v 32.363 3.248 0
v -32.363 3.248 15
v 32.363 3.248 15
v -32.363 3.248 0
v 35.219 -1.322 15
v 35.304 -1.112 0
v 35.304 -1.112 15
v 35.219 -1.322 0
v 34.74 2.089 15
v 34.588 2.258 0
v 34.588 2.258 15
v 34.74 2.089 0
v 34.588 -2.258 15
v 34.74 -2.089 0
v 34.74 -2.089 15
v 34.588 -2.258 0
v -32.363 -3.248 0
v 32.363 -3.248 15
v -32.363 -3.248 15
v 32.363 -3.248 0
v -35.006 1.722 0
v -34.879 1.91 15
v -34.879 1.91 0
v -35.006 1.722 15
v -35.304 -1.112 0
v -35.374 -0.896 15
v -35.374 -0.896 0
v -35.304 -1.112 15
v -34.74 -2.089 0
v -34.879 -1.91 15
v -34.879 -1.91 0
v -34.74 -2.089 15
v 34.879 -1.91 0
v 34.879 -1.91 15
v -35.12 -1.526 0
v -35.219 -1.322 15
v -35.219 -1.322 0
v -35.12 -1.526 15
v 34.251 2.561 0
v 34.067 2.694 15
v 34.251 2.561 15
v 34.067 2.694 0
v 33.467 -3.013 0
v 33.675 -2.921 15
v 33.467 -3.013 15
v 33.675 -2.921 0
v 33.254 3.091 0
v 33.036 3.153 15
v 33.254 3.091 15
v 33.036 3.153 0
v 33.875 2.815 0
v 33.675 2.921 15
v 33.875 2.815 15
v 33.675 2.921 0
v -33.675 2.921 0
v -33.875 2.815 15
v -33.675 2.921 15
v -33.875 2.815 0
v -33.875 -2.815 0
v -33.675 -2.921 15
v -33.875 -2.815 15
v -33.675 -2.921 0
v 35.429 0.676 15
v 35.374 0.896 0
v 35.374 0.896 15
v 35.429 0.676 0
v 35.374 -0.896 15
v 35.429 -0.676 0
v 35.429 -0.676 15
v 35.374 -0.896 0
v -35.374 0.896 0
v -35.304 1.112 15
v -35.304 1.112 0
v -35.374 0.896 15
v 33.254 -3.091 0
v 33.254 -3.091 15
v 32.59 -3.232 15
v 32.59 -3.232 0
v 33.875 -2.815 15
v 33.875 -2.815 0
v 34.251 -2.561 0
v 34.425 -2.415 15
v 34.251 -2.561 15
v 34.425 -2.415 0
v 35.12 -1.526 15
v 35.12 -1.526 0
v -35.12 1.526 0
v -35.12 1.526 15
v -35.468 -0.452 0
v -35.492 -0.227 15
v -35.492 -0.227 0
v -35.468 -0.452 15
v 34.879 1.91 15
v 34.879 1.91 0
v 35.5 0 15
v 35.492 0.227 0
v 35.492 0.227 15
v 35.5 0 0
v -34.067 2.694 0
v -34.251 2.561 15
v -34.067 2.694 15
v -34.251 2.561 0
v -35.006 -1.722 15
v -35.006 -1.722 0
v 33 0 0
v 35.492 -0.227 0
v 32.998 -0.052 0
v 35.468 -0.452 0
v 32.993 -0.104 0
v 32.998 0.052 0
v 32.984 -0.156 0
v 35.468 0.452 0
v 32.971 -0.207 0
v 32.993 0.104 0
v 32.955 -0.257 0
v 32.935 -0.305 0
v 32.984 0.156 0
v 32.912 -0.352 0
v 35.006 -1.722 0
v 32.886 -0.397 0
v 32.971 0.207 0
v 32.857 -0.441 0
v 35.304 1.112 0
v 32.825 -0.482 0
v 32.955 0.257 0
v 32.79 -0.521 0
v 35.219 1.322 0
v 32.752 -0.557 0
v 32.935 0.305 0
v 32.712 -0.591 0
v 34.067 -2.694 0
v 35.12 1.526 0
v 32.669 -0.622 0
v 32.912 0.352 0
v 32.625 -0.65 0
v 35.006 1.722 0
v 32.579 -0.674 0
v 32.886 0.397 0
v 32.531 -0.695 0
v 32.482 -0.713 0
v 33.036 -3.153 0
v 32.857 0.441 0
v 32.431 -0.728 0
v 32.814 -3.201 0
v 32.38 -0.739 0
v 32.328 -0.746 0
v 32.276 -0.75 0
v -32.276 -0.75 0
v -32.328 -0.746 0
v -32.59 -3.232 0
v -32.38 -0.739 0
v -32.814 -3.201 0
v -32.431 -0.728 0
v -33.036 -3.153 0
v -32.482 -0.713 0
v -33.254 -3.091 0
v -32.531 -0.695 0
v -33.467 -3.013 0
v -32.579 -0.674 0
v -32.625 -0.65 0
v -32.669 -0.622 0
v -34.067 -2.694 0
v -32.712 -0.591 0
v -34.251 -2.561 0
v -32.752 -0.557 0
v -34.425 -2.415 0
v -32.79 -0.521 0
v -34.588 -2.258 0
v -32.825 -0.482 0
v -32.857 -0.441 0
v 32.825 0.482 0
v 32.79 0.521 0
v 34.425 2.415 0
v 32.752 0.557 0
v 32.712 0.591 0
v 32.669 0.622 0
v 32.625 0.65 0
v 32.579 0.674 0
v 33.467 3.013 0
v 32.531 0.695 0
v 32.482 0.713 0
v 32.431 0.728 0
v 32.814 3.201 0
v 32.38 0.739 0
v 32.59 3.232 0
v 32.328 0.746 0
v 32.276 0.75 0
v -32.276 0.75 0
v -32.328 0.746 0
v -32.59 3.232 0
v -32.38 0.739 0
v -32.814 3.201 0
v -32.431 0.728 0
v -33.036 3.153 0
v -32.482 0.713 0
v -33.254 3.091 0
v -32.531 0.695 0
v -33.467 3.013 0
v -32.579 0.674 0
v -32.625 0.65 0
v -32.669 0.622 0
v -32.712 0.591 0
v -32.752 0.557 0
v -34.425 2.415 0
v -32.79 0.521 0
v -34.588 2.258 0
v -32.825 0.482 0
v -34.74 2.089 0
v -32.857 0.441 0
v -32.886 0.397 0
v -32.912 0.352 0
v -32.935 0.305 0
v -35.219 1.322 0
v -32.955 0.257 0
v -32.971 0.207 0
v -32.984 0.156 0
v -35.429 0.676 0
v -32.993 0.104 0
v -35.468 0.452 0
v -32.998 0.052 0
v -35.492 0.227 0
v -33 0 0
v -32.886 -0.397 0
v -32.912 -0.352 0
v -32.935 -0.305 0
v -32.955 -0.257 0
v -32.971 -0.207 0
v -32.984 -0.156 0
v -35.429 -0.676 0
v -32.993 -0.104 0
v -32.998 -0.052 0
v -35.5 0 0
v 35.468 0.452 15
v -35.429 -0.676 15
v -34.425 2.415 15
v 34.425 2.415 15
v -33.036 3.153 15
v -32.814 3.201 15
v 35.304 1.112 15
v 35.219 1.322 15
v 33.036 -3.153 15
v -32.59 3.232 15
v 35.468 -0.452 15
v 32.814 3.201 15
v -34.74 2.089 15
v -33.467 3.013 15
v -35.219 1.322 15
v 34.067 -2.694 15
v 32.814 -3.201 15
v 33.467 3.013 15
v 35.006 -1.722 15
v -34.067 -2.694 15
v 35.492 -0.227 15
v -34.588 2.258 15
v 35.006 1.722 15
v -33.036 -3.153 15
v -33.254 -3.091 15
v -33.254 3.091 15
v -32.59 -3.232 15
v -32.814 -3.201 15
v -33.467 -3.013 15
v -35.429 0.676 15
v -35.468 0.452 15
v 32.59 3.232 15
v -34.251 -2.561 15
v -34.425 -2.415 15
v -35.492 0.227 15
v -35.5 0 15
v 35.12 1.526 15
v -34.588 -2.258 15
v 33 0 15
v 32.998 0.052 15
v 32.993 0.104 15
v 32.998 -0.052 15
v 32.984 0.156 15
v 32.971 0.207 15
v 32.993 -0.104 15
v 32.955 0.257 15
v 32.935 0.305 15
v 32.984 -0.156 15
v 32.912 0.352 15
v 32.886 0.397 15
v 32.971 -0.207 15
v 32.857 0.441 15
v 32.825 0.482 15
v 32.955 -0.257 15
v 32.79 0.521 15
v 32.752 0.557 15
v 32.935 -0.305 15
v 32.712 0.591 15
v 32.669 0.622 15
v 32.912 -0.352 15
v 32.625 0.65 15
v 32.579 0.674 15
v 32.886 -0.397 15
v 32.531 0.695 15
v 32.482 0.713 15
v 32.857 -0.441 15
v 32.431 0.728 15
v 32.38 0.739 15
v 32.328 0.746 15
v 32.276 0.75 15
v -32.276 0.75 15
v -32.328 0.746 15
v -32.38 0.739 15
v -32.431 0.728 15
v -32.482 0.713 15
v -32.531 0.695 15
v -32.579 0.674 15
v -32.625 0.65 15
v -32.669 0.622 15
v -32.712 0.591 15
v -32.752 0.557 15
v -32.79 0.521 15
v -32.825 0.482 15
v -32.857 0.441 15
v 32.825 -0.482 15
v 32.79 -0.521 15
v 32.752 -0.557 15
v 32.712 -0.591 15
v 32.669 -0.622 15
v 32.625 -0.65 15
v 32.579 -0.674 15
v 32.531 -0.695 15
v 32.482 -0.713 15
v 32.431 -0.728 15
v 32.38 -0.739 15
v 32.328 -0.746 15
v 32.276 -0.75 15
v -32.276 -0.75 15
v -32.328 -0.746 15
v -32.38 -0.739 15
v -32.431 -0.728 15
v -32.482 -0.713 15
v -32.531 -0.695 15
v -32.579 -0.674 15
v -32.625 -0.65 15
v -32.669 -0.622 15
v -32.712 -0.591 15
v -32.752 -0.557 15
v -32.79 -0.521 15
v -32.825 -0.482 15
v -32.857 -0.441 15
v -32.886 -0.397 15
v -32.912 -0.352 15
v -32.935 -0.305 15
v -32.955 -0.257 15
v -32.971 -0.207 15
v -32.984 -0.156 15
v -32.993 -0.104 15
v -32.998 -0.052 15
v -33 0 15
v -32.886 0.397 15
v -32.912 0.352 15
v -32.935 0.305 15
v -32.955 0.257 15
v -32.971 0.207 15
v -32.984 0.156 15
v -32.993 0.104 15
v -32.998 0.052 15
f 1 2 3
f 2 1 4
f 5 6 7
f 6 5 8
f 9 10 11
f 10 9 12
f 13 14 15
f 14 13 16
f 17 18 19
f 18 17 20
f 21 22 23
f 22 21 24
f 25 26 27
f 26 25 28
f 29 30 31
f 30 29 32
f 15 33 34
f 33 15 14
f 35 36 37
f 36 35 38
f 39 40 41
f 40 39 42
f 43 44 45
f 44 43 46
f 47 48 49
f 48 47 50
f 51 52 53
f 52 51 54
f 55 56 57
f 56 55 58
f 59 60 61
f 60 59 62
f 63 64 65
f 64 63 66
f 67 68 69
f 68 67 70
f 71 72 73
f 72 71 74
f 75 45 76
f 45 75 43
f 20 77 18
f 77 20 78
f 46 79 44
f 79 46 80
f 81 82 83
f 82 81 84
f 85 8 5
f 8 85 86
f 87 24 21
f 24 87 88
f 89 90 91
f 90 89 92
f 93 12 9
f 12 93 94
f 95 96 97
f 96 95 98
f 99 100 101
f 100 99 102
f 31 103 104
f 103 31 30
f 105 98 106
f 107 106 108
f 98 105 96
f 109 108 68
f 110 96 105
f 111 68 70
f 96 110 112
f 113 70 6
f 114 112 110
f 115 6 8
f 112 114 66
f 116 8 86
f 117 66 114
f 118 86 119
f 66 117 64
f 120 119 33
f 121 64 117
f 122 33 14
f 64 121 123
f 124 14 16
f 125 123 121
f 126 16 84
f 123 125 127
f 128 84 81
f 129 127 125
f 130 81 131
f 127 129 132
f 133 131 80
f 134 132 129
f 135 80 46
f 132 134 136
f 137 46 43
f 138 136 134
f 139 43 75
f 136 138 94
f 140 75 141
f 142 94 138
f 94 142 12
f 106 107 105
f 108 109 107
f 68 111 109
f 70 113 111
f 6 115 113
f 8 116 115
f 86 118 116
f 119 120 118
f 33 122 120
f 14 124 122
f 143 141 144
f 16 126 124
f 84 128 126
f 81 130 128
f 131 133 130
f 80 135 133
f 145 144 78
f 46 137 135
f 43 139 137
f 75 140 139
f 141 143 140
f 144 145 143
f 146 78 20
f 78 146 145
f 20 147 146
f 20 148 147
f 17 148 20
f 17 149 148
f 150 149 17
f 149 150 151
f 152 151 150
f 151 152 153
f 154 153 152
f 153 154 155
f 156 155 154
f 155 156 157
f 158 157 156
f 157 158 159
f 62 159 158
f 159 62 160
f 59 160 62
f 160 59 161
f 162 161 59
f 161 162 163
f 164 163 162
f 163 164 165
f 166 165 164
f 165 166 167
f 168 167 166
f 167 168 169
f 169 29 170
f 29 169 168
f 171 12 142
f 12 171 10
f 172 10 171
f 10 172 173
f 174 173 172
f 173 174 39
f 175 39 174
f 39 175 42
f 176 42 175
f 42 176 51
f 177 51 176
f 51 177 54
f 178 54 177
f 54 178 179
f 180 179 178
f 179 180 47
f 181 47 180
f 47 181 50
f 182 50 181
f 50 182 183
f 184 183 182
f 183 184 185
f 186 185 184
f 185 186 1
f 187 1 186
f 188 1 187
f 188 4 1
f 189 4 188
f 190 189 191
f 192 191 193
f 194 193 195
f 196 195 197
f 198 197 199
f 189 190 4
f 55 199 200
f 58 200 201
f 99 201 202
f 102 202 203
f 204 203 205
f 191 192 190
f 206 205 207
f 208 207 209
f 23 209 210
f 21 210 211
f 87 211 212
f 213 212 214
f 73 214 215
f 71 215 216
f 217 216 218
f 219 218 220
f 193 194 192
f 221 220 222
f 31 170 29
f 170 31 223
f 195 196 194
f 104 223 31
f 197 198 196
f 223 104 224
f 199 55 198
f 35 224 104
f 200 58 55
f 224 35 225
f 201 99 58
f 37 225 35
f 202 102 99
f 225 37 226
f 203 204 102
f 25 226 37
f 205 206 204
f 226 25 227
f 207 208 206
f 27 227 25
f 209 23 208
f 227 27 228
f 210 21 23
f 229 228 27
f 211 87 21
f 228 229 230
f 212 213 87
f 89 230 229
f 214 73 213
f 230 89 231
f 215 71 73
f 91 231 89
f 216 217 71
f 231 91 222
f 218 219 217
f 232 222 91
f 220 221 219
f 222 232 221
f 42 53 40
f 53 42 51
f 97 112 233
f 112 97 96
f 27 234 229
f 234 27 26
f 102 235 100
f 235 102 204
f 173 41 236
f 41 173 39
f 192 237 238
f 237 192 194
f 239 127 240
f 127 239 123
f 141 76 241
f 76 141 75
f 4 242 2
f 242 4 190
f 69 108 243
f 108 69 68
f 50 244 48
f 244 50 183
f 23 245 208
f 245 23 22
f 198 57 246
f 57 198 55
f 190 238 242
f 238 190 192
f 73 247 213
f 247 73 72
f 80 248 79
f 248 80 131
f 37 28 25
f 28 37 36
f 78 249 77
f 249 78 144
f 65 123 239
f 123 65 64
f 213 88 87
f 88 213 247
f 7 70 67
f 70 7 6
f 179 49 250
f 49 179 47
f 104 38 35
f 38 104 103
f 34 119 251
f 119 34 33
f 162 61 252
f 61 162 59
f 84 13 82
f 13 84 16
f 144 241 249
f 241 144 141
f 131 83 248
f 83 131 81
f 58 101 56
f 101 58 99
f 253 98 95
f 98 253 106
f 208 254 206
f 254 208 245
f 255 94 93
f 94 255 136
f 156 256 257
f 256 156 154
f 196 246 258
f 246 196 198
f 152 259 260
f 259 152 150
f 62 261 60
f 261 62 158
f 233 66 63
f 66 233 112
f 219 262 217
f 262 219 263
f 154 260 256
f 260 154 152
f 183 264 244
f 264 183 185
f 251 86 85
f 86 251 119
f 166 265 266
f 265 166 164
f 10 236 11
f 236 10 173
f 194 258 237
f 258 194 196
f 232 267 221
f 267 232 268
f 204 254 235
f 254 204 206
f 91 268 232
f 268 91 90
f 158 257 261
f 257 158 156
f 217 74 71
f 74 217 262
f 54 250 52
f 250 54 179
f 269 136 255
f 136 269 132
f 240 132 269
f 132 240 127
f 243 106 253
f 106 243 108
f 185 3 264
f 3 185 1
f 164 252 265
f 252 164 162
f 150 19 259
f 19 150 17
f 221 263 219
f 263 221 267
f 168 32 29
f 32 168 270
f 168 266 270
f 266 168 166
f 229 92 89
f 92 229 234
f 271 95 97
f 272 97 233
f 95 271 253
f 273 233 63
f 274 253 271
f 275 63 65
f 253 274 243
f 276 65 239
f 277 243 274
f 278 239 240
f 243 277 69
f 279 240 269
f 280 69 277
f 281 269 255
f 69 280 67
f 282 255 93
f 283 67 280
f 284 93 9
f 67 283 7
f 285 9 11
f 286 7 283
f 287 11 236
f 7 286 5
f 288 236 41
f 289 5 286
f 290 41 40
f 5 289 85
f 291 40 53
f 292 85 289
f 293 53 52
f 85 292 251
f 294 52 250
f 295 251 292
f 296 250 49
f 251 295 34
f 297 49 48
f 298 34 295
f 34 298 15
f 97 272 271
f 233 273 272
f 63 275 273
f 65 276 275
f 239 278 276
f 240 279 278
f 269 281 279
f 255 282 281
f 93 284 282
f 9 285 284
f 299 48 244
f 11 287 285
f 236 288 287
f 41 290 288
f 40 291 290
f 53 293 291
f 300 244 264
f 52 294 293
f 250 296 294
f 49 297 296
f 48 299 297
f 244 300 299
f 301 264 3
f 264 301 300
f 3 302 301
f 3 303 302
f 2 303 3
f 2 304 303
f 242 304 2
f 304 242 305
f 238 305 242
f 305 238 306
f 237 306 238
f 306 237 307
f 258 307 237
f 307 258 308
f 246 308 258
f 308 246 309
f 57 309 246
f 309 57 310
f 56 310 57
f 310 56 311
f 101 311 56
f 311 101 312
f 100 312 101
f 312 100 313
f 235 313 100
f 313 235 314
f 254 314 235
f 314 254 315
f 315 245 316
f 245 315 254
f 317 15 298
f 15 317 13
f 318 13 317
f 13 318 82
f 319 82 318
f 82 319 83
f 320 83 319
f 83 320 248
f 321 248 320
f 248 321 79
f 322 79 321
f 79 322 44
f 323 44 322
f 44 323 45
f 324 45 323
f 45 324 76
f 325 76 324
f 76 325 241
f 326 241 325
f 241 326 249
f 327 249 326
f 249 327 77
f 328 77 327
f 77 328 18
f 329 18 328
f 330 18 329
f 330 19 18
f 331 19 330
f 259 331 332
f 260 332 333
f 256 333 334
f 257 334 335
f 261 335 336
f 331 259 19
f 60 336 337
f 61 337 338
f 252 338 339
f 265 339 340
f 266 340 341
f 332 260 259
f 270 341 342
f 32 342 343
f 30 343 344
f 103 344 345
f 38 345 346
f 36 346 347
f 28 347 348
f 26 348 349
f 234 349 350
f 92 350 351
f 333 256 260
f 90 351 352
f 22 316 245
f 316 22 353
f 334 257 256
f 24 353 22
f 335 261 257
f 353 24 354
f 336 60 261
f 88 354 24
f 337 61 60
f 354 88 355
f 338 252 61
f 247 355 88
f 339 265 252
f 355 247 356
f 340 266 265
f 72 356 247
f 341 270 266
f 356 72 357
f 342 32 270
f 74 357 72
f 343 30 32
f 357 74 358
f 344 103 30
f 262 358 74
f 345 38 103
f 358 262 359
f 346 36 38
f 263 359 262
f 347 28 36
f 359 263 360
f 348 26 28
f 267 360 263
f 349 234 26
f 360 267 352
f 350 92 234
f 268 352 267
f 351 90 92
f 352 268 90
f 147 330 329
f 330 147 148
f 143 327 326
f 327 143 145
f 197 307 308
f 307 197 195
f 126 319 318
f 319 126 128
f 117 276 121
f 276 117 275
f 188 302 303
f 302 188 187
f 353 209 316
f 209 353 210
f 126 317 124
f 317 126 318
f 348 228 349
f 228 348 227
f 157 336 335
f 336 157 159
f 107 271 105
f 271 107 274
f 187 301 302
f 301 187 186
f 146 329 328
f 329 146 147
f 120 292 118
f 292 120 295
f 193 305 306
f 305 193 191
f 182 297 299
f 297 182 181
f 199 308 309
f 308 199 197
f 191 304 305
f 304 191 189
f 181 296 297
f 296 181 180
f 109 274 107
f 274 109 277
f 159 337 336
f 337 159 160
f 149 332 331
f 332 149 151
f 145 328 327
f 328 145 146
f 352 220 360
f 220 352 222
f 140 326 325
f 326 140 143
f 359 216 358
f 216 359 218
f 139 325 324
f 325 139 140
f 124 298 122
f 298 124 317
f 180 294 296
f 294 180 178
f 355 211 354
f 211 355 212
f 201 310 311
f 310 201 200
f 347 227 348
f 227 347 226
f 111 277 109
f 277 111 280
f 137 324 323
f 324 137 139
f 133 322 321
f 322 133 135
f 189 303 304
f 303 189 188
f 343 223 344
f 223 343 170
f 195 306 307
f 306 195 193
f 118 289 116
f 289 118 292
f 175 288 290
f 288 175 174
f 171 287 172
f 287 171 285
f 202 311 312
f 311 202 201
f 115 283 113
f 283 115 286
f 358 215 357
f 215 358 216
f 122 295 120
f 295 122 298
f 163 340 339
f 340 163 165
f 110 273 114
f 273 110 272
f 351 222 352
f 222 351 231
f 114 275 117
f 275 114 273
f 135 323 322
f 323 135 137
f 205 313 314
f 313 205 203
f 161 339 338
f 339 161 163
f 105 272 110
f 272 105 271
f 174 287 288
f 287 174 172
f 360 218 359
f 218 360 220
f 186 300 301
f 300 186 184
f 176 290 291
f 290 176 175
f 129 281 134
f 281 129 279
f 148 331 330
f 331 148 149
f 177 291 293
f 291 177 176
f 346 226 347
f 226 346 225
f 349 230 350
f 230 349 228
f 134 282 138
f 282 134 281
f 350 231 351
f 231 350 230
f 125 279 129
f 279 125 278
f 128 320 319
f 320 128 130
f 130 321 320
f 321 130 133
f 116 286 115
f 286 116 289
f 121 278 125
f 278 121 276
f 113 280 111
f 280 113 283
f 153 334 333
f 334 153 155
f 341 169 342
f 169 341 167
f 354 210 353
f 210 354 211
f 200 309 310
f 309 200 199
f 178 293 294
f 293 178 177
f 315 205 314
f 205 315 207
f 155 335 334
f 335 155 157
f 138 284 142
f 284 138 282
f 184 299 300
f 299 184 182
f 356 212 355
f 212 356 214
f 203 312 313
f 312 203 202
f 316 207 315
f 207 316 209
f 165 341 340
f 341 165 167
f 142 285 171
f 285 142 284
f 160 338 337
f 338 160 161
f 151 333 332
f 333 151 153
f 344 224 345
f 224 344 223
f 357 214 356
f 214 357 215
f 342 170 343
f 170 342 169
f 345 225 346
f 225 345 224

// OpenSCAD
//
//  toothpastesqueezer.scad
//
//  EvilTeach
//
//  12/11/2016
//

$fn=90;                 // Make very smooth ends


slitWidth  = 66.00;     // Plenty of extra room to make it easy to put on
slitDepth  =  1.50;     // Just a bit too wide to make it easy to put on
slitHeight = 15.00;     // High enough that an adult finger covers it

thickness  =  5.00;     // Material outside of the slit

// Make a cube with rounded ends.
module rounded_cube(width, depth, height)
{
    hull()
    {
        translate([depth / 2, 0, 0])
            cylinder(d = depth, h = height);
        translate([width - depth / 2, 0, 0])
            cylinder(d = depth, h = height);
    }
}



module main()
{
    // Center on build plate
    translate([-((slitWidth + thickness) / 2) , 0, 0])
    
    // Make a large cube and remove the smaller slit from inside it
    difference()
    {
        rounded_cube(slitWidth + thickness, 
                     slitDepth + thickness, 
                     slitHeight);
        translate([thickness / 2, 0, 0])
            rounded_cube(slitWidth, slitDepth, slitHeight);
    }
}

main();
